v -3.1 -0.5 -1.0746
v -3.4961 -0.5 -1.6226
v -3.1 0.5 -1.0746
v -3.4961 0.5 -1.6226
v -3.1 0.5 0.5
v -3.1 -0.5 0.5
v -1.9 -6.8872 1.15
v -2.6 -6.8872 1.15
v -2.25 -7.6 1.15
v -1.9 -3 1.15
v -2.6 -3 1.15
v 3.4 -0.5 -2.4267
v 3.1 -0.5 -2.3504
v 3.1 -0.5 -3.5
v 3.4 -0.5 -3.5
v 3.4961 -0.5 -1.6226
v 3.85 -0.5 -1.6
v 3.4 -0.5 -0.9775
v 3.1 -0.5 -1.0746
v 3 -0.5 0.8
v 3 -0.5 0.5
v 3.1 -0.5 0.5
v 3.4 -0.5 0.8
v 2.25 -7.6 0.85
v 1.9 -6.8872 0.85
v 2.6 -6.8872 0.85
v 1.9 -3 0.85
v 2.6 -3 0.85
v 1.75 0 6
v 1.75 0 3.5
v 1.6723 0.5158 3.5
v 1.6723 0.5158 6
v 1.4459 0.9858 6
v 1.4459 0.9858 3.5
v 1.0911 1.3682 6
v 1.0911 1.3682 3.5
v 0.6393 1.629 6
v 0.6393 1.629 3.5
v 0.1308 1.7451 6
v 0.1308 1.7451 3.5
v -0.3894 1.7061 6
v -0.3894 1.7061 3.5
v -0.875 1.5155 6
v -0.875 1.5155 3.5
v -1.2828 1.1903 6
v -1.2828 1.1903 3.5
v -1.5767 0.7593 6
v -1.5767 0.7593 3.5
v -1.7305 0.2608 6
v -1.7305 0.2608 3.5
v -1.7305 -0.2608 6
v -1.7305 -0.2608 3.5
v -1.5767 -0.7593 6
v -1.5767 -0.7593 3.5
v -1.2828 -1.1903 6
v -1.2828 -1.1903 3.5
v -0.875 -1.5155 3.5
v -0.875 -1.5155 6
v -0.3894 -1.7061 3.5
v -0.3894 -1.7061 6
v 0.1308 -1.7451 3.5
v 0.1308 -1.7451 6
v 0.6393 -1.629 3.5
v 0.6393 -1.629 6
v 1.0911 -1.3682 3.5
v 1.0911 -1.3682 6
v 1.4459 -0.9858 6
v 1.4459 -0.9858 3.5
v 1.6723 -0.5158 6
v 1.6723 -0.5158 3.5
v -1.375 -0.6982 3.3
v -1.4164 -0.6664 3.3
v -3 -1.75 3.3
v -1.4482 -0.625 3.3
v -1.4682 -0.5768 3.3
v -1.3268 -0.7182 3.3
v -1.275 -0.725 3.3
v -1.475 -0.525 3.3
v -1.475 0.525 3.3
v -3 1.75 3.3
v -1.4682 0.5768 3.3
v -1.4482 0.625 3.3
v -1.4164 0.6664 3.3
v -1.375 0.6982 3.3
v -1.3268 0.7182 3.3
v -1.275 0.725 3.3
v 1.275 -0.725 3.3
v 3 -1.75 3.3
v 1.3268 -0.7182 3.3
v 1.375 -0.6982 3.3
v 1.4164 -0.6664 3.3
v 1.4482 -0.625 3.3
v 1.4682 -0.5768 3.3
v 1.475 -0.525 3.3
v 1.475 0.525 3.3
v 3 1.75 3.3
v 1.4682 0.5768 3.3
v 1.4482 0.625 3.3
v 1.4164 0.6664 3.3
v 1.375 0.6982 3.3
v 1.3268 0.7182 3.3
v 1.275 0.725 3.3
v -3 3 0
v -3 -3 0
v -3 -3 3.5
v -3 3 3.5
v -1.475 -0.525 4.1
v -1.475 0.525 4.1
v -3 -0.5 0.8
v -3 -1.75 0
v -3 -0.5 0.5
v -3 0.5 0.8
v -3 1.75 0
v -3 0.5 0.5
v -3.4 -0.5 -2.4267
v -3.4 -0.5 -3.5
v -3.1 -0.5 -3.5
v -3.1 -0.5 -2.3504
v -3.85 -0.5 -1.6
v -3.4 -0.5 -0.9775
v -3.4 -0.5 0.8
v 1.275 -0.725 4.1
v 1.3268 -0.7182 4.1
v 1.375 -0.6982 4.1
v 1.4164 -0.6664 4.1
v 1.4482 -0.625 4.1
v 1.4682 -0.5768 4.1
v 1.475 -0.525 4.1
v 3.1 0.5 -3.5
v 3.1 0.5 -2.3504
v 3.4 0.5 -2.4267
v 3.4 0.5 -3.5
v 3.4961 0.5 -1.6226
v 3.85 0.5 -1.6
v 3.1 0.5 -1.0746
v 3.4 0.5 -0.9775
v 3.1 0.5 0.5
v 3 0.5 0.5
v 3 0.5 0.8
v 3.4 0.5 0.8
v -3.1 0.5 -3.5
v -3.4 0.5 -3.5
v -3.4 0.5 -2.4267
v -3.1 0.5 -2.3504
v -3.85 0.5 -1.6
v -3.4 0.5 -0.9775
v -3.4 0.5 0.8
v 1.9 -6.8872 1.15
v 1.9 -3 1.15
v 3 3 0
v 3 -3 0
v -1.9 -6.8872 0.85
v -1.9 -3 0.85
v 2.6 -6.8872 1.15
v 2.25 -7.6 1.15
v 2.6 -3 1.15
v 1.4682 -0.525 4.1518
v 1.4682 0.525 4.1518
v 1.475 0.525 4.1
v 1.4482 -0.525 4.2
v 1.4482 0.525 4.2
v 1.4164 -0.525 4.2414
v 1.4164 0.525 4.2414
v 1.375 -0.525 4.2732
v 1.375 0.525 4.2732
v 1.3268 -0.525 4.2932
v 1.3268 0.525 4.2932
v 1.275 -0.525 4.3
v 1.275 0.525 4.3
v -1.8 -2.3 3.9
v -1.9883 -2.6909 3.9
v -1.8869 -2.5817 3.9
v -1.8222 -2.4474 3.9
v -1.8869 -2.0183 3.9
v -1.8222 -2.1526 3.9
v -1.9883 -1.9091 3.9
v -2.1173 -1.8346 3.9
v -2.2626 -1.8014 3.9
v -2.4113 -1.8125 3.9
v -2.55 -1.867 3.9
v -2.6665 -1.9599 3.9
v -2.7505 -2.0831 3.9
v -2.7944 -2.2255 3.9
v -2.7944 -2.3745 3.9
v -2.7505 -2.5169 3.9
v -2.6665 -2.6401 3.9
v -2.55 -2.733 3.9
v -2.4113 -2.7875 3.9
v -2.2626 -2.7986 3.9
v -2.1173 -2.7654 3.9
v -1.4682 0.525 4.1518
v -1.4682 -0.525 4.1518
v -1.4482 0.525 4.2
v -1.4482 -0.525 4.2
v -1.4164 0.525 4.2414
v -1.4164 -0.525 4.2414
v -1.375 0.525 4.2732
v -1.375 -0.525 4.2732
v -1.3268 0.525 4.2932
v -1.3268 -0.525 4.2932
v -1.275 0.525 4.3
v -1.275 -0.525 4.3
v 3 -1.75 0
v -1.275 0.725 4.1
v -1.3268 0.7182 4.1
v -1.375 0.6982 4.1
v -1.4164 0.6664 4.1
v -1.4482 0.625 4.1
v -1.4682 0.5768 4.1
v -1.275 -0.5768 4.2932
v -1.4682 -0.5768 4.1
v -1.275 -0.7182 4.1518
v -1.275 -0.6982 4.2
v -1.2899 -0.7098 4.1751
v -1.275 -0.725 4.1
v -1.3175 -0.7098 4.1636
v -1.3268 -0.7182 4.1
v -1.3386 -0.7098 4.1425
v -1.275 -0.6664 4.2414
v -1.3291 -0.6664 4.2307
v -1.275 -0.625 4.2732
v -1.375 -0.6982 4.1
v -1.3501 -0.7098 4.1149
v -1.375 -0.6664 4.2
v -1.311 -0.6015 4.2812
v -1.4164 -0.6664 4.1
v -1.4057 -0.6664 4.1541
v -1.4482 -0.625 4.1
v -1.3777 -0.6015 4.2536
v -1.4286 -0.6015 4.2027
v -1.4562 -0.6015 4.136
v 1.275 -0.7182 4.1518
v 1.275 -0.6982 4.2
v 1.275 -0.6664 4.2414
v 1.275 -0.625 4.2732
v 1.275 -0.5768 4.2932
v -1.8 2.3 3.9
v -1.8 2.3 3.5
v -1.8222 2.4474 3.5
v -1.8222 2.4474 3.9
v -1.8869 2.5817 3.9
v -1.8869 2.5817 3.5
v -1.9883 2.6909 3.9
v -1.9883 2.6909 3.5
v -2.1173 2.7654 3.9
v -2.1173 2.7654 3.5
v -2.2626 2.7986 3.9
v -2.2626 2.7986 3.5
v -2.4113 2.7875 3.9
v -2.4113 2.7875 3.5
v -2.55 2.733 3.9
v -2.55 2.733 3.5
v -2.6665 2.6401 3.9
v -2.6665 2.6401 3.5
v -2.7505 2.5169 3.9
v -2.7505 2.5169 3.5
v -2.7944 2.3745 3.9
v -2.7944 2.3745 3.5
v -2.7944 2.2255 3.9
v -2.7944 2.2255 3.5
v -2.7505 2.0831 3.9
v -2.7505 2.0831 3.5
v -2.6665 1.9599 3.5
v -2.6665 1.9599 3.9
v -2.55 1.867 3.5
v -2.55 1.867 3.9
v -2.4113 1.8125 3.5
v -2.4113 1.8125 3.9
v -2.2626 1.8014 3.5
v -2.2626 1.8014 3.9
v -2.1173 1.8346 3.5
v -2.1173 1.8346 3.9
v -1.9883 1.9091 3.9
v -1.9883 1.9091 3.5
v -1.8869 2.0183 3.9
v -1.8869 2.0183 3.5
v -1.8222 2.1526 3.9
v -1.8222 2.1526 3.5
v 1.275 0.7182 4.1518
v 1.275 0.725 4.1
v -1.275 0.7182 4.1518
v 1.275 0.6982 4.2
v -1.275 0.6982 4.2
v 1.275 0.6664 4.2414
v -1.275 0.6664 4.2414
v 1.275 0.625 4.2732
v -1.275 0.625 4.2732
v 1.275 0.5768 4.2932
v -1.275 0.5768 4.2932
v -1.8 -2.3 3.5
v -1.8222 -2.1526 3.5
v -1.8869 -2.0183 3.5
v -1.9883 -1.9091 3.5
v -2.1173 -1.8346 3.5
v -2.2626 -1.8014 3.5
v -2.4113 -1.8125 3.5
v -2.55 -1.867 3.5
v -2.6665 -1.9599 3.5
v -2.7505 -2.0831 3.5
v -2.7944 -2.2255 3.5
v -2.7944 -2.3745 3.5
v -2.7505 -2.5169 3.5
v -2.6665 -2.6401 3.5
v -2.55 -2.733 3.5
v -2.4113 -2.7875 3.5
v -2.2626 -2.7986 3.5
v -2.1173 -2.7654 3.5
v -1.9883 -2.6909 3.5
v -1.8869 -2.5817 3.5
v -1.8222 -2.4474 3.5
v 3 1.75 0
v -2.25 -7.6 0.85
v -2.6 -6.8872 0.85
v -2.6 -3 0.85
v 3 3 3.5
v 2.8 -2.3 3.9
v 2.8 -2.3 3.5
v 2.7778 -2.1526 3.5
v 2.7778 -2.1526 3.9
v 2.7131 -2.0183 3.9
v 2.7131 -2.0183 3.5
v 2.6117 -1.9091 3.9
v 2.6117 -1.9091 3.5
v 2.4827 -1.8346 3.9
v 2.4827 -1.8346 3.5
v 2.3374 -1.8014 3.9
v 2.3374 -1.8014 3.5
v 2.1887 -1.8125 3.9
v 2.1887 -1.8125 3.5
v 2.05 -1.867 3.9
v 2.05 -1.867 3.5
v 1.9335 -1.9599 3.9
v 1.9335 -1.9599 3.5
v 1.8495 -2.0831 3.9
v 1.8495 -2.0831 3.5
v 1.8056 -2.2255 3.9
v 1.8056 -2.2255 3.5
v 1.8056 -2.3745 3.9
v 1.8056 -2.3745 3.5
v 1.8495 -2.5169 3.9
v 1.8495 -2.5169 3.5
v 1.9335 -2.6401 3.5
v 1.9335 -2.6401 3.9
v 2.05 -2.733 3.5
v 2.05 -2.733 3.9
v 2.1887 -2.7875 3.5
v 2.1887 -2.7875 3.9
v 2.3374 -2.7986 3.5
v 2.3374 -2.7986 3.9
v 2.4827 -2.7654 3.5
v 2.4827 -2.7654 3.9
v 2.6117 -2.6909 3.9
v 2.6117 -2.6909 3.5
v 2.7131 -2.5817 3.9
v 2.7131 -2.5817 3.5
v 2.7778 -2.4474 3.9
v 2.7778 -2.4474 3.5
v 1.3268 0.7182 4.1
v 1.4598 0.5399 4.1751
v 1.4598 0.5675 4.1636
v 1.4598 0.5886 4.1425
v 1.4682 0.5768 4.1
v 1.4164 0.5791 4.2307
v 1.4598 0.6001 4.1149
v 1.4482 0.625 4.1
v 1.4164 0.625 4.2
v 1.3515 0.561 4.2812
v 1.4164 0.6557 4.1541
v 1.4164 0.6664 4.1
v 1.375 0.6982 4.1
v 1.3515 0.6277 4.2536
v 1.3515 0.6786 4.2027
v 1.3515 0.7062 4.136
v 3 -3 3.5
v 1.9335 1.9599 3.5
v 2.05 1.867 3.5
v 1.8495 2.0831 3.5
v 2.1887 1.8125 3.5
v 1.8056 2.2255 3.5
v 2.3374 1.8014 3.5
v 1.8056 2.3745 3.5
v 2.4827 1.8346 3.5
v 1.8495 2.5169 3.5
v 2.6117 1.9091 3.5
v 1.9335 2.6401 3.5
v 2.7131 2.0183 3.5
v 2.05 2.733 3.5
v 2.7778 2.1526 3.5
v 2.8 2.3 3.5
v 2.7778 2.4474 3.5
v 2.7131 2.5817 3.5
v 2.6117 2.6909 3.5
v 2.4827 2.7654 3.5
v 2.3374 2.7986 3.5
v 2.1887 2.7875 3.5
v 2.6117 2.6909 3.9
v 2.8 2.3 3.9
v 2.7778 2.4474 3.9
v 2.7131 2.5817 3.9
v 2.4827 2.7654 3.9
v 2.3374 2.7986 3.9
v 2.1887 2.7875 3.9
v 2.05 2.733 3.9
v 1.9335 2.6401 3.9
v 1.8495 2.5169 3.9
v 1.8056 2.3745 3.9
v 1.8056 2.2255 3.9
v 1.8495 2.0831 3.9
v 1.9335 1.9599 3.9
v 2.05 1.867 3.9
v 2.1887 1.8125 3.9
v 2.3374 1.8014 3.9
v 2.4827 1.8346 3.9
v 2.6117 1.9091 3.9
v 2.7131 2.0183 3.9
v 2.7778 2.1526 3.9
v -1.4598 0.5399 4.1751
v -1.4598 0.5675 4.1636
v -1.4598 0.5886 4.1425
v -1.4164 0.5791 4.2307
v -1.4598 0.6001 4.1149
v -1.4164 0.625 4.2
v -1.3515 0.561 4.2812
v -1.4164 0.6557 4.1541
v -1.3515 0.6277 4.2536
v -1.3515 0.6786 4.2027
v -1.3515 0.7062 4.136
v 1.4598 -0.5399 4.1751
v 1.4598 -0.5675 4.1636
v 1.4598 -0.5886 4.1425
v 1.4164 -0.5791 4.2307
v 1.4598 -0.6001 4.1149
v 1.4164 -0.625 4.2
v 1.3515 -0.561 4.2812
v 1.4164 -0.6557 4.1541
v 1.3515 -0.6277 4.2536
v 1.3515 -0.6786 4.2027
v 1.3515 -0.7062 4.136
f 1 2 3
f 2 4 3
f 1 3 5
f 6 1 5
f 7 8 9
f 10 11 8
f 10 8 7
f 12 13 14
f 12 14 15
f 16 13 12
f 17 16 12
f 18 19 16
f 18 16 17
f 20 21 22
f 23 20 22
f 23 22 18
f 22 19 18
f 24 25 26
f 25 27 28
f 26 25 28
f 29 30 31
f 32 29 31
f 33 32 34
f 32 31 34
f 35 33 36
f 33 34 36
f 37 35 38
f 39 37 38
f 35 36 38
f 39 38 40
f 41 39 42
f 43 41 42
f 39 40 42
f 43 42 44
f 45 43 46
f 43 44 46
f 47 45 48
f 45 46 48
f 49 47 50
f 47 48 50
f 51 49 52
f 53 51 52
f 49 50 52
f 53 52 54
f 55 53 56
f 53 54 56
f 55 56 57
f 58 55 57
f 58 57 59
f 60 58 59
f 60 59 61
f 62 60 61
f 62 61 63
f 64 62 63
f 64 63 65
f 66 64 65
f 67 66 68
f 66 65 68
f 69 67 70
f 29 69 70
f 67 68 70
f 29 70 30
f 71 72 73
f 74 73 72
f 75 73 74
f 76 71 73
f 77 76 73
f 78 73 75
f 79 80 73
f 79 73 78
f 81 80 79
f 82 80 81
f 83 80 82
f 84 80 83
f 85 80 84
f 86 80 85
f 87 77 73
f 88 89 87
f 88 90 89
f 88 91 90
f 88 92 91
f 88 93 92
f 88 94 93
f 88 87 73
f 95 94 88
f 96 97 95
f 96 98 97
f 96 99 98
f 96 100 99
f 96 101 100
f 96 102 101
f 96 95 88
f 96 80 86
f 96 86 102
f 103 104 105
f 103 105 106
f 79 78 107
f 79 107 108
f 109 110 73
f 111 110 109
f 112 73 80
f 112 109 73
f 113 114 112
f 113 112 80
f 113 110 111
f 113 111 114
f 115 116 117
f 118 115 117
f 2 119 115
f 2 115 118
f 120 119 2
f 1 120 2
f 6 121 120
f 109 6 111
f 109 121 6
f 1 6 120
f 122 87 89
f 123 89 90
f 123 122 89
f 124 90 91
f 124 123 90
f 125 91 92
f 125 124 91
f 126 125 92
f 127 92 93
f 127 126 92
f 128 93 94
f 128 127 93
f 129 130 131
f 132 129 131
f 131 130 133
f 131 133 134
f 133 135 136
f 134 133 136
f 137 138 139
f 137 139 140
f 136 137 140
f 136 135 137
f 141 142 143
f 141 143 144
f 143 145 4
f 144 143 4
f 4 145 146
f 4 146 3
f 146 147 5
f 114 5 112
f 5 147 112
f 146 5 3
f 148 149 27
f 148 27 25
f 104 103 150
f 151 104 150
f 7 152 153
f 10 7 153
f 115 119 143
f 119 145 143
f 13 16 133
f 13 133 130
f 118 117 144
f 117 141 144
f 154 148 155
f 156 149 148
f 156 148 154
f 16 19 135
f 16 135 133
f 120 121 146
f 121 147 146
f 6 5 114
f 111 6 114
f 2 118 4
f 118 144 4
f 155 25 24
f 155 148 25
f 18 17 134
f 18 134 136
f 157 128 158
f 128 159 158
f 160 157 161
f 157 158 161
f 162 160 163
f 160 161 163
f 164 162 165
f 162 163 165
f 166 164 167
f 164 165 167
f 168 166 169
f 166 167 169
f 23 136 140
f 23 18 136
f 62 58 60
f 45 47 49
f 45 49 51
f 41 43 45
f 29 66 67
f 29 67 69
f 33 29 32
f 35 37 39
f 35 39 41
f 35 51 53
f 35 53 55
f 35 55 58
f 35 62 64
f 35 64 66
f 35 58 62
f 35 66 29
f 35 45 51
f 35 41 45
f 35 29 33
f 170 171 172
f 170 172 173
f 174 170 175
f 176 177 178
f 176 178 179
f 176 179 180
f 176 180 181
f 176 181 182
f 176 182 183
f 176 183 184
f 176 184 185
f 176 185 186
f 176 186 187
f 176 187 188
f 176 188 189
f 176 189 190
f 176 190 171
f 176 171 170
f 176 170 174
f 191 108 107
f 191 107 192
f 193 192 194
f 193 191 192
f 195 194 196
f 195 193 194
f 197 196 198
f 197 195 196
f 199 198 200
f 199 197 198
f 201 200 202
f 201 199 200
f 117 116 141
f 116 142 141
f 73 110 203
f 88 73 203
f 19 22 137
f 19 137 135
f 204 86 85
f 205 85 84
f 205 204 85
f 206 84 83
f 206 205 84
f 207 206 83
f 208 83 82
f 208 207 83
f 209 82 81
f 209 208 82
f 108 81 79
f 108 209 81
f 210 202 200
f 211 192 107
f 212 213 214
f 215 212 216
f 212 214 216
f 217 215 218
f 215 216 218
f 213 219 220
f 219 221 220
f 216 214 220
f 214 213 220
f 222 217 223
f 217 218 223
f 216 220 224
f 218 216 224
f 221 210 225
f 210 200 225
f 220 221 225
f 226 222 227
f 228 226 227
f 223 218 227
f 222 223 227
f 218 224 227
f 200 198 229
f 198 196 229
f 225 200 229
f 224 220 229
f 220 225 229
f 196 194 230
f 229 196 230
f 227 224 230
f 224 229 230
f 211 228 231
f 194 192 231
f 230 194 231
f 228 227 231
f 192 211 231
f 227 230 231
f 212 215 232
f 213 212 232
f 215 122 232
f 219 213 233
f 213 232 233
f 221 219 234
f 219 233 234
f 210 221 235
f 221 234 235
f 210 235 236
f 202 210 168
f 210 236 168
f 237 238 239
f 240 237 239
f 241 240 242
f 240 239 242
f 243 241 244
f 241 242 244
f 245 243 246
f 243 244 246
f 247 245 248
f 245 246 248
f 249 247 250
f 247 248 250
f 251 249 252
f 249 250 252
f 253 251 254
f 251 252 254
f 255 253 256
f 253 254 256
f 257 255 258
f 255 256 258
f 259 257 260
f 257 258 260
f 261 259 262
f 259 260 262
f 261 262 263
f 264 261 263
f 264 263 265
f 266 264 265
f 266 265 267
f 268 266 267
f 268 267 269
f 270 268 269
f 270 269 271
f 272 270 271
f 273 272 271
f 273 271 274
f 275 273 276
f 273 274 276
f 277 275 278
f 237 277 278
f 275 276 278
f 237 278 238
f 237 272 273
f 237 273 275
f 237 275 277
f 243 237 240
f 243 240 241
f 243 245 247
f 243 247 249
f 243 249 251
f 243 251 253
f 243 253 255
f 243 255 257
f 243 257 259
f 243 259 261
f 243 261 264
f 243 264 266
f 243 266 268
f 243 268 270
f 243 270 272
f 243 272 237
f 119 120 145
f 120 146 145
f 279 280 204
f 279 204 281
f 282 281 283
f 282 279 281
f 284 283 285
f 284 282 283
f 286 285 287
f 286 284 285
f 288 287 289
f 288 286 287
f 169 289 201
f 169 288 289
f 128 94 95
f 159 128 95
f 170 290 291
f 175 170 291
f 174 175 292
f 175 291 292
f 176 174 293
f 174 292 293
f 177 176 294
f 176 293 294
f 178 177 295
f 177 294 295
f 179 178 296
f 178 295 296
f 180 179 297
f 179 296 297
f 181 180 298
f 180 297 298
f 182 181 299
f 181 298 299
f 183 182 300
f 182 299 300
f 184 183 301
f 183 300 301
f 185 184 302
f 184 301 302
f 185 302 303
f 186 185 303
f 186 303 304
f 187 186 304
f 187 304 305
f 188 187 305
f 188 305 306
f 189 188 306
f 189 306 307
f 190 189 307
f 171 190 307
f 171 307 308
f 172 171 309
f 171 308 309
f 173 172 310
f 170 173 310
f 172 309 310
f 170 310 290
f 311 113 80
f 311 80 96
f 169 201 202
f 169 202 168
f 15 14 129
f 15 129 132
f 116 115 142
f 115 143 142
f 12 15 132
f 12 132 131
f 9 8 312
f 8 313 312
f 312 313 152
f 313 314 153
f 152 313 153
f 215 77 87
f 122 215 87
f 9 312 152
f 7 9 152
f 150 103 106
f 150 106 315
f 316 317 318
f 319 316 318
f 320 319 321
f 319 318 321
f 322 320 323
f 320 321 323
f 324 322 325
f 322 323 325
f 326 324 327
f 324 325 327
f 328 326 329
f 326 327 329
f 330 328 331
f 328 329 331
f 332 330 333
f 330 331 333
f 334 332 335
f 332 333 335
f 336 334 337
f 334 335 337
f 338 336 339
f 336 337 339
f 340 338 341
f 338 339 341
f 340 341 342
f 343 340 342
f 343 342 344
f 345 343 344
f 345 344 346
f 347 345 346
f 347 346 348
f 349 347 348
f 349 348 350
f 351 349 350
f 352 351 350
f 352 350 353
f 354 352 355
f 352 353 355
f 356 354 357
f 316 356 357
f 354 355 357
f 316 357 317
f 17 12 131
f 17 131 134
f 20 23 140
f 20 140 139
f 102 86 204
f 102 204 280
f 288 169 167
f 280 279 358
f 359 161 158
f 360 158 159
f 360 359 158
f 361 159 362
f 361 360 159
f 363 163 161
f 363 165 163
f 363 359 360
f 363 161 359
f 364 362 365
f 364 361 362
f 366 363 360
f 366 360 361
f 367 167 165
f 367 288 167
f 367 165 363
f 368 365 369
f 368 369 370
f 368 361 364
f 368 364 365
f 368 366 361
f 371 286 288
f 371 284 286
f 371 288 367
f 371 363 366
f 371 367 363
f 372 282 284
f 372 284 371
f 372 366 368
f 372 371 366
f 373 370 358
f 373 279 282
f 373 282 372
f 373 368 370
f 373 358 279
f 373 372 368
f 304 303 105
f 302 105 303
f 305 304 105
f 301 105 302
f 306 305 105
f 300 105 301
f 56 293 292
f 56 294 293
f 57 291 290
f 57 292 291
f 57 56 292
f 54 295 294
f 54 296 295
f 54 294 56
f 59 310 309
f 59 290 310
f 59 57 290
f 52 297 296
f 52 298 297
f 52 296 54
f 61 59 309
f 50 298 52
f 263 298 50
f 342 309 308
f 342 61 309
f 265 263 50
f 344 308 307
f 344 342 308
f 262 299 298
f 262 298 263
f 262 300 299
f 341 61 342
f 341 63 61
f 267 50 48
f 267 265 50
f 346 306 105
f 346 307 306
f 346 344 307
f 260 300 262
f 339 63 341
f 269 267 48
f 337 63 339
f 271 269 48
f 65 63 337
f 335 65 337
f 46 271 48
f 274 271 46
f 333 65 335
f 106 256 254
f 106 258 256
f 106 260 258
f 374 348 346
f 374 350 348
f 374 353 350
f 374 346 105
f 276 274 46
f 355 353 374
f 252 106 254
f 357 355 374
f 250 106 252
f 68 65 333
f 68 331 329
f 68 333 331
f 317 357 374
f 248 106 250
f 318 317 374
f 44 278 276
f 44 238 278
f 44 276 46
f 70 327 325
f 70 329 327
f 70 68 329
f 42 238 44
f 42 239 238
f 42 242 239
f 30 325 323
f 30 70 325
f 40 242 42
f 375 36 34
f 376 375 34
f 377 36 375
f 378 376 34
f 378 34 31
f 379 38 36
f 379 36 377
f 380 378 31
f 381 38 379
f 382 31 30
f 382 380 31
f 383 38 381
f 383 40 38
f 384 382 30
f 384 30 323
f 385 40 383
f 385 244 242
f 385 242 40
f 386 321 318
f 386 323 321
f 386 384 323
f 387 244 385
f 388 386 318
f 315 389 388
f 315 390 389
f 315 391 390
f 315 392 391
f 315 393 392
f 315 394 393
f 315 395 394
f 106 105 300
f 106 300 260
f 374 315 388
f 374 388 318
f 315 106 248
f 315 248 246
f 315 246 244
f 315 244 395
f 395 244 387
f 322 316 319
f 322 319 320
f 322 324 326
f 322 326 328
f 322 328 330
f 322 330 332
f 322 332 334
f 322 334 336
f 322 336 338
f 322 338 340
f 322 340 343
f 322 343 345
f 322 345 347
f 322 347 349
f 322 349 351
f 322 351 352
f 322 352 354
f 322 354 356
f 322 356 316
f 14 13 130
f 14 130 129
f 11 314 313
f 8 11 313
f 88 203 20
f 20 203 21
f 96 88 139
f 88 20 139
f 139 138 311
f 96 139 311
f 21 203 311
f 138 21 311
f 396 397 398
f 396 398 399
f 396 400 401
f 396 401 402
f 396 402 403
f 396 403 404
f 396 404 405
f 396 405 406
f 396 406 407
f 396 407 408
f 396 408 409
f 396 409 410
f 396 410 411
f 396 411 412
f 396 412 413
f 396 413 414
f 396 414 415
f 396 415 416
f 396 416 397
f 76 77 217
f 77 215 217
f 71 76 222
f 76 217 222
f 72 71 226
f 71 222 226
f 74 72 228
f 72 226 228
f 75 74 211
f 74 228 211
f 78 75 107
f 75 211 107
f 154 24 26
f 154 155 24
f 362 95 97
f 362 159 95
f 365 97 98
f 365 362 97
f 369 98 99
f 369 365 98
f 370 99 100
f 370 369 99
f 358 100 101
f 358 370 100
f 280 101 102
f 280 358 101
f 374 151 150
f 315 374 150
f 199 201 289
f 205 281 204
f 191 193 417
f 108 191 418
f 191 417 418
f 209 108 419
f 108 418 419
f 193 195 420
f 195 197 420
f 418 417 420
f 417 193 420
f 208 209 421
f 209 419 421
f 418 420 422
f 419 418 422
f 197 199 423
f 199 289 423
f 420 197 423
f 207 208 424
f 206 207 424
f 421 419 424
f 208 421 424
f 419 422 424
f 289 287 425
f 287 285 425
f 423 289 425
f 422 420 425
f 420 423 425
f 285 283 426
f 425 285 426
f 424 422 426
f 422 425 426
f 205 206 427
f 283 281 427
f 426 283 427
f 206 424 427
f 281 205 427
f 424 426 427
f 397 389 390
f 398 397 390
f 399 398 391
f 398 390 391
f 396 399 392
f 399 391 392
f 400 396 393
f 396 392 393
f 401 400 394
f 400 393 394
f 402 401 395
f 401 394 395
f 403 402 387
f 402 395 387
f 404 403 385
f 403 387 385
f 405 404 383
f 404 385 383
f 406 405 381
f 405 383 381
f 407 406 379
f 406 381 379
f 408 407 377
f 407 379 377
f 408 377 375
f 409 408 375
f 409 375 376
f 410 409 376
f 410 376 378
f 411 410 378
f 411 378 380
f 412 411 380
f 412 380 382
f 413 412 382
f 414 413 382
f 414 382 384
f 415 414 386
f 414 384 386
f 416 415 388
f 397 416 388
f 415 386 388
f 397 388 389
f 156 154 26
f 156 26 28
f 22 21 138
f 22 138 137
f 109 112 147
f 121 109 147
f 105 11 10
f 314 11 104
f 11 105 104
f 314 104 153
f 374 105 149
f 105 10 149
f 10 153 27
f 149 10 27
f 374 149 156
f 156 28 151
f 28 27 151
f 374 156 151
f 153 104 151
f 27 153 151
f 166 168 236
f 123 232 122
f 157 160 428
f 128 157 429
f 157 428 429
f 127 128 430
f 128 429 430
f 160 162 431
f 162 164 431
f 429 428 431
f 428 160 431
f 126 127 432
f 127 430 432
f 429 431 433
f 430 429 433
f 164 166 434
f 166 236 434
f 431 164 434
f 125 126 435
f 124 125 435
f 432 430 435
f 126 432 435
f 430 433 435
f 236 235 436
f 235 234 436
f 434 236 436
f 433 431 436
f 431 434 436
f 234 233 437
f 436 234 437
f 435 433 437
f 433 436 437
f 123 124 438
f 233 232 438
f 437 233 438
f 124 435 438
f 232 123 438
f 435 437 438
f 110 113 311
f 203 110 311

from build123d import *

# Parameters (mm, degrees)
F0_W      = 6
F0_H      = 3.5
F1_DEPTH  = 3.3
F2_W      = 2.95
F2_H      = 1.45
F3_DEPTH  = 1
F5_DEPTH  = 0.5
F6_R      = 0.2
F7_W      = 6
F7_H      = 6
F8_DEPTH  = 3.5
F9_R      = 1.75
F10_DEPTH = 2.5
F11_R     = 0.5
F12_DEPTH = 0.4
F15_DEPTH = 0.15


with BuildPart() as f1:
    # F0 (on Top) → F1 (new body)
    with BuildSketch(Plane.XY):
        Rectangle(F0_W, F0_H)
    extrude(amount=F1_DEPTH)

    # F2 (on face) → F3 (join)
    with BuildSketch(Plane.XY.offset(3.3)):
        Rectangle(F2_W, F2_H)
    extrude(amount=F3_DEPTH)

    # F4 (on Front) → F5 (join, symmetric)
    with BuildSketch(Plane.XZ):
        Polygon((-2.8612716207, 0.5), (-2.8612716207, 0.8), (-3.4, 0.8), (-3.4, -0.9775243754), (-3.85, -1.6), (-3.4, -2.4267251601), (-3.4, -3.5), (-3.1, -3.5), (-3.1, -2.3503671472), (-3.4961440499, -1.6225843626), (-3.1, -1.0746065516), (-3.1, 0.5), align=None)
        Polygon((2.8612716207, 0.8), (2.8612716207, 0.5), (3.1, 0.5), (3.1, -1.0746065516), (3.4961440499, -1.6225843626), (3.1, -2.3503671472), (3.1, -3.5), (3.4, -3.5), (3.4, -2.4267251601), (3.85, -1.6), (3.4, -0.9775243754), (3.4, 0.8), align=None)
    extrude(amount=F5_DEPTH, both=True)

    # F6
    f6_edges = [f1.edges().sort_by_distance(p)[0] for p in [
        (0, 0.725, 4.3),
        (-1.475, 0, 4.3),
        (0, -0.725, 4.3),
        (1.475, 0, 4.3),
        (-1.475, -0.725, 3.8),
        (1.475, -0.725, 3.8),
        (1.475, 0.725, 3.8),
        (-1.475, 0.725, 3.8),
    ]]
    fillet(f6_edges, radius=F6_R)


with BuildPart() as f8:
    # F7 (on Top) → F8 (new body)
    with BuildSketch(Plane.XY):
        Rectangle(F7_W, F7_H)
    extrude(amount=F8_DEPTH)

    # F9 (on face) → F10 (join)
    with BuildSketch(Plane.XY.offset(3.5)):
        Circle(F9_R)
    extrude(amount=F10_DEPTH)

    # F11 (on face) → F12 (join)
    with BuildSketch(Plane.XY.offset(3.5)):
        with Locations((-2.3, 2.3)):
            Circle(F11_R)
        with Locations((-2.3, -2.3)):
            Circle(F11_R)
        with Locations((2.3, 2.3)):
            Circle(F11_R)
        with Locations((2.3, -2.3)):
            Circle(F11_R)
    extrude(amount=F12_DEPTH)

    # F14 (on offset) → F15 (join, symmetric)
    with BuildSketch(Plane.XY.offset(1)):
        Polygon((-1.9, -2.9941034311), (-2.6, -2.9941034311), (-2.6, -6.8871881813), (-2.25, -7.6), (-1.9, -6.8871881813), align=None)
        Polygon((2.6, -6.8871881813), (2.6, -2.9941034311), (1.9, -2.9941034311), (1.9, -6.8871881813), (2.25, -7.6), align=None)
    extrude(amount=F15_DEPTH, both=True)


solid = Compound([f1.part, f8.part])
